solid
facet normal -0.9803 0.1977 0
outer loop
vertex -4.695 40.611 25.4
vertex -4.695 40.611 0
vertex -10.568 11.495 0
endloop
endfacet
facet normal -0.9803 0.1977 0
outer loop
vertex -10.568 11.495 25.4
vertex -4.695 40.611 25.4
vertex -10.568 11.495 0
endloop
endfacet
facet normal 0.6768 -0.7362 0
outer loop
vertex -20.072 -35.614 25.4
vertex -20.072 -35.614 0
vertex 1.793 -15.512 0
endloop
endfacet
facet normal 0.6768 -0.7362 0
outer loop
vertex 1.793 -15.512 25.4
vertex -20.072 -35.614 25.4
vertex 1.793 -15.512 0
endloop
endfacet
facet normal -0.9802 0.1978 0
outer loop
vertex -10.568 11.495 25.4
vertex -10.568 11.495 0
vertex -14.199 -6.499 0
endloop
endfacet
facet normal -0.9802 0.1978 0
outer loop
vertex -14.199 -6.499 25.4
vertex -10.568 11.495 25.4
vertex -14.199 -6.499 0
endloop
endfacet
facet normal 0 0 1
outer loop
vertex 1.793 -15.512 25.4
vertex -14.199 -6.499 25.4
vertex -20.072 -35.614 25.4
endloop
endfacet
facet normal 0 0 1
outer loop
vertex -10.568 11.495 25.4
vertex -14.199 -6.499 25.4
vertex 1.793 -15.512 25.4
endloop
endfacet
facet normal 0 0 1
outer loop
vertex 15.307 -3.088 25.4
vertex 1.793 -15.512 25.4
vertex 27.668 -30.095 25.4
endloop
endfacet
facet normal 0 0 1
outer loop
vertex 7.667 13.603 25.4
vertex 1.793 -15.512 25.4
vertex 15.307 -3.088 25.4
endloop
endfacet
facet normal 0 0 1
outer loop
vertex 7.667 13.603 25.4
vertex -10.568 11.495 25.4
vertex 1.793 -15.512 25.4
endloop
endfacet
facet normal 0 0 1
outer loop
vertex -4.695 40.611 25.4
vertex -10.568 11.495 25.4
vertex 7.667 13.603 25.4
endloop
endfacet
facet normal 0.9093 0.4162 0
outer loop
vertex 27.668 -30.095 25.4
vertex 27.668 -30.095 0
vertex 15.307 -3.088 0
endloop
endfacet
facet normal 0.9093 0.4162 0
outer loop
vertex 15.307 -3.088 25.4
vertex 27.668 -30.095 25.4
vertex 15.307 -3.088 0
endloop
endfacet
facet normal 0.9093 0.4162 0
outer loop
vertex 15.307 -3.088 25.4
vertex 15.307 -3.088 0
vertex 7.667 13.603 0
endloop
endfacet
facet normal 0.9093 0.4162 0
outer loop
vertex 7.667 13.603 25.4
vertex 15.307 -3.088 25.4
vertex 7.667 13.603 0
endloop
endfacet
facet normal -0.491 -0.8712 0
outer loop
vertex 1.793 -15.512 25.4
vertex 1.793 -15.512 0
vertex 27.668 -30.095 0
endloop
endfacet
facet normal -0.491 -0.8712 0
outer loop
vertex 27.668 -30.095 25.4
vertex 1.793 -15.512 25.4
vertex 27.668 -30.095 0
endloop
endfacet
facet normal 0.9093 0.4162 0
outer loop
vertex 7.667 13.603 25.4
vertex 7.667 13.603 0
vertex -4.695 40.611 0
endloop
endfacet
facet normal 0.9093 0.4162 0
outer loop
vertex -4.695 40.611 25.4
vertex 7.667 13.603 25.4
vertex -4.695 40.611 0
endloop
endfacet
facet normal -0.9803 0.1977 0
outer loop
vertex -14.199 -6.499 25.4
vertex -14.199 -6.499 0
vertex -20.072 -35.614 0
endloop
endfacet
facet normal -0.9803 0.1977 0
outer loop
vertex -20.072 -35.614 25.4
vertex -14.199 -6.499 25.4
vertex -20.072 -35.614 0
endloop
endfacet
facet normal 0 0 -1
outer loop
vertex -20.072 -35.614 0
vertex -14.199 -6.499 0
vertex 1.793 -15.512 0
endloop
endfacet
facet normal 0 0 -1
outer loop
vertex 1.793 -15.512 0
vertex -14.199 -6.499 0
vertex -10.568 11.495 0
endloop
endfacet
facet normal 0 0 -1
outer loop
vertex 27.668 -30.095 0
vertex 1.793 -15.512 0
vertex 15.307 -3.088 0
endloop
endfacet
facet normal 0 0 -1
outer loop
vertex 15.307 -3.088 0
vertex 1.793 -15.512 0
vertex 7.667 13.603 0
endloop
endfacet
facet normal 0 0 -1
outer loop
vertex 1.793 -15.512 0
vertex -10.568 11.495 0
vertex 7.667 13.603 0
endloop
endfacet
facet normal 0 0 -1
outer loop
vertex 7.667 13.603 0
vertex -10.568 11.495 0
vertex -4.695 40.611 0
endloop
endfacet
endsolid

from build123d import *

# Parameters (mm, degrees)
F1_DEPTH = 25.4


with BuildPart() as f1:
    # F0 (on Top) → F1 (new body)
    with BuildSketch(Plane.XY):
        Polygon((-20.0724594905, -35.6141963687), (1.793154165, -15.5119398539), (-14.198616368, -6.4988439839), align=None)
        Polygon((1.793154165, -15.5119398539), (15.306846589, -3.0880620772), (7.6669972876, 13.6034125308), (-10.5683816736, 11.4954333843), (-14.198616368, -6.4988439839), align=None)
        Polygon((-10.5683816736, 11.4954333843), (7.6669972876, 13.6034125308), (-4.694538551, 40.6107857691), align=None)
        Polygon((27.6683824276, -30.0954353155), (15.306846589, -3.0880620772), (1.793154165, -15.5119398539), align=None)
    extrude(amount=F1_DEPTH)


solid = f1.part
